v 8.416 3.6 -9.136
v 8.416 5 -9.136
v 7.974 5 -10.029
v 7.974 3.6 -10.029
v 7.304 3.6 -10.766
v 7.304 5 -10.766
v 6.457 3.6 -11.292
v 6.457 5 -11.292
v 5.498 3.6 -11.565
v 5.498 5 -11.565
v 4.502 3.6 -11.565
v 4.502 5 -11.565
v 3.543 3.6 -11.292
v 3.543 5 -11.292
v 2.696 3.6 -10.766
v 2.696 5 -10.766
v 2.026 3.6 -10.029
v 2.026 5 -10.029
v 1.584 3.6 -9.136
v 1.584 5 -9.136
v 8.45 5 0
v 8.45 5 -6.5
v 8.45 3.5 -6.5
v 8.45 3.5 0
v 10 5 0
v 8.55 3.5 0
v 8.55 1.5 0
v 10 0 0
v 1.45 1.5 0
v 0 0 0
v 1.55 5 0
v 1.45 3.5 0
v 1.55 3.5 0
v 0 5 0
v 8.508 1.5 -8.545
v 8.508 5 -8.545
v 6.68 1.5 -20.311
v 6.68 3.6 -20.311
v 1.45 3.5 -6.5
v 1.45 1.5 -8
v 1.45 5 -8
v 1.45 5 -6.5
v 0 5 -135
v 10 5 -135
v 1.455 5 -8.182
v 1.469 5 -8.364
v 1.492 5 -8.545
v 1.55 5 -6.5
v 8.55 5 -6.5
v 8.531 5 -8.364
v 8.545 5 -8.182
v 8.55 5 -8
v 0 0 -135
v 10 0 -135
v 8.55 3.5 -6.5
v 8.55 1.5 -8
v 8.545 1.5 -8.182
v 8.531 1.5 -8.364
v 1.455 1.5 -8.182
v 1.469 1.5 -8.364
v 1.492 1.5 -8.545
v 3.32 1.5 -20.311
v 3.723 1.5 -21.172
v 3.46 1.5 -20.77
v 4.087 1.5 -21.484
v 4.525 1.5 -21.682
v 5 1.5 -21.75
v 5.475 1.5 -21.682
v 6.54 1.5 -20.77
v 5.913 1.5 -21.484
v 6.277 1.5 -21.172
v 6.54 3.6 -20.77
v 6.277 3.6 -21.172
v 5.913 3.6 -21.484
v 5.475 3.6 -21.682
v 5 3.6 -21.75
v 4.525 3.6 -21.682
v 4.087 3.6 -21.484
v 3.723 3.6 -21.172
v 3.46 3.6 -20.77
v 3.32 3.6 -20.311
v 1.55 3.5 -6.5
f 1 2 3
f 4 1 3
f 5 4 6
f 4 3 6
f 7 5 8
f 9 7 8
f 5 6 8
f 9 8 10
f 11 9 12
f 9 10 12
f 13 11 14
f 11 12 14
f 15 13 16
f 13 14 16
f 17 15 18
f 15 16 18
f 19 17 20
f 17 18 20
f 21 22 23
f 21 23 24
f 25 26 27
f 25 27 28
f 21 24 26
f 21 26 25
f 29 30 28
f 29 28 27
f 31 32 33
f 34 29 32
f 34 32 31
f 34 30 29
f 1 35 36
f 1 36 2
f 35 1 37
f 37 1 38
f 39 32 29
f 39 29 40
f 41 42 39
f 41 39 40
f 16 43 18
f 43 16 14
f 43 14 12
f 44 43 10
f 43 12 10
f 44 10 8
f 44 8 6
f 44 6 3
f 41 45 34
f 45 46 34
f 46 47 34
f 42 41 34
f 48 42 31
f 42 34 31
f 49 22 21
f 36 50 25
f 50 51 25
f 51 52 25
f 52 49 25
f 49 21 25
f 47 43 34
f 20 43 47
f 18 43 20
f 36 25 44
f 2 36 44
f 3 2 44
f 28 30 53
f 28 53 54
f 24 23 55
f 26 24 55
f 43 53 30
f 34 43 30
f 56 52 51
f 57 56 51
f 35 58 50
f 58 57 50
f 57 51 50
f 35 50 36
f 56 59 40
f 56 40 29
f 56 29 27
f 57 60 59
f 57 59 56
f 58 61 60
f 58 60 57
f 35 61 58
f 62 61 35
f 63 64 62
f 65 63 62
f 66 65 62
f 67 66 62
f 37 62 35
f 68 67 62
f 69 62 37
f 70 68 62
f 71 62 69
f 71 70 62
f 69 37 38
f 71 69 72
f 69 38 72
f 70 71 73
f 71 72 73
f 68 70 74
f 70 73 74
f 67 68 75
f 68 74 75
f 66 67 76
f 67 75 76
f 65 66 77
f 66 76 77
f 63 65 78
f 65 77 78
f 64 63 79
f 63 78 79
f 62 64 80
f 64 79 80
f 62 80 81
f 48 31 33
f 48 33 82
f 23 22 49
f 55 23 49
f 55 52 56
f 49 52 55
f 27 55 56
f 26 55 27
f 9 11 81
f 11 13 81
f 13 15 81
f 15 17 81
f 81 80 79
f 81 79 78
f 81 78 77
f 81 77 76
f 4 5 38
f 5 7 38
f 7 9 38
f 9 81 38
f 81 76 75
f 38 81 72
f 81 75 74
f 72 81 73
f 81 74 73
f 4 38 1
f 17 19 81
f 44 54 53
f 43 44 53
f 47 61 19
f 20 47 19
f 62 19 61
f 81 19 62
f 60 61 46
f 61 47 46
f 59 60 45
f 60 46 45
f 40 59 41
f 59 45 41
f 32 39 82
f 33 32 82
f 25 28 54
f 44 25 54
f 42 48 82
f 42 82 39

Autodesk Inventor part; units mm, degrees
ref_plane "YZ Plane" through (0, 0, 0) normal (1, 0, 0) x (0, 1, 0)
ref_plane "XZ Plane" through (0, 0, 0) normal (0, 1, 0) x (-1, 0, 0)
ref_plane "XY Plane" through (0, 0, 0) normal (0, 0, 1) x (1, 0, 0)
sketch "Esquisse1" plane through (0, 0, 0) normal (1, 0, 0) x (0, 1, 0)
  line L0 (0, 0) -> (5, 0)
  line L1 (5, 0) -> (5, -30)
  line L2 (5, -30) -> (0, -30)
  line L3 (0, -30) -> (0, 0)
  dimension "d0" = 5
  dimension "d1" = 30
extrude "Extrusion1" add sketch "Esquisse1" along normal blind 10
sketch "Esquisse2" plane through (0, 5, 0) normal (0, 1, 0) x (1, 0, 0)
  line L0 (0, 0) -> (5, 0)
  line L1 (0, 0) -> (10, 0) projected
  line L2 (5, 0) -> (5, 8)
  arc A0 (1.4921, 8.545) -> (8.5079, 8.545) centre (5, 8) ccw
  line L3 (5, 21.75) -> (5, 20.05)
  arc A1 (6.6798, 20.311) -> (3.3202, 20.311) centre (5, 20.05) ccw
  line L4 (1.4921, 8.545) -> (3.3202, 20.311)
  line L5 (8.5079, 8.545) -> (6.6798, 20.311)
  line L6 (5, 4.45) -> (5, 11.55)
  line L7 (5, 18.35) -> (5, 21.75)
  dimension "d4" = 8
  dimension "d5" = 7.1
  dimension "d6" = 17.3
  dimension "d7" = 1.7
extrude "Extrusion2" cut sketch "Esquisse2" against normal blind 3.5
sketch "Esquisse3" plane through (0, 5, 0) normal (0, 1, 0) x (1, 0, 0)
  arc A0 (1.4921, 8.545) -> (8.5079, 8.545) centre (5, 8) ccw projected
  arc A1 (8.4161, 9.1358) -> (1.5839, 9.1358) centre (5, 8) ccw
  arc A2 (6.6798, 20.311) -> (3.3202, 20.311) centre (5, 20.05) ccw projected
  arc A3 (6.6798, 20.311) -> (3.3202, 20.311) centre (5, 20.05) ccw
  line L0 (1.4921, 8.545) -> (3.3202, 20.311) projected
  line L1 (3.3202, 20.311) -> (1.4921, 8.545)
  line L2 (6.6798, 20.311) -> (8.5079, 8.545)
  point P0 (0, 0)
  dimension "d24" = 7.2
extrude "Extrusion5" add sketch "Esquisse3" against normal blind 1.4 contours L0 A2 L2 A1
sketch "Esquisse5" plane through (0, 5, 0) normal (0, 1, 0) x (1, 0, 0)
  arc A0 (1.4921, 8.545) -> (8.5079, 8.545) centre (5, 8) ccw projected
  line L0 (5, 0) -> (1.45, 0)
  line L1 (0, 0) -> (10, 0) projected
  line L2 (1.45, 0) -> (1.45, 8)
  line L3 (1.45, 8) -> (8.55, 8)
  line L4 (8.55, 8) -> (8.55, 0)
  line L5 (8.55, 0) -> (1.45, 0)
  line L6 (5, 8) -> (5, 0)
  dimension "d27" = 3.55
  dimension "d28" = 7.1
extrude "Extrusion6" cut sketch "Esquisse5" against normal blind 3.5
sketch "Esquisse6" plane through (0, 5, 0) normal (0, 1, 0) x (1, 0, 0)
  arc A0 (8.4161, 9.1358) -> (1.5839, 9.1358) centre (5, 8) ccw projected
  line L0 (5, 8) -> (5, 0)
  line L1 (5, 0) -> (1.55, 0)
  line L2 (0, 0) -> (10, 0) projected
  line L3 (1.55, 0) -> (1.55, 6.5)
  line L4 (8.45, 6.5) -> (8.45, 0)
  line L5 (8.45, 0) -> (1.55, 0)
  line L6 (8.55, 8) -> (8.55, 0) projected
  line L7 (8.45, 6.5) -> (8.55, 6.5)
  line L8 (8.55, 6.5) -> (8.55, 0)
  line L9 (8.55, 0) -> (8.45, 0)
  line L10 (8.45, 0) -> (8.45, 6.5)
  line L11 (1.45, 0) -> (1.45, 8) projected
  line L12 (1.55, 6.5) -> (1.45, 6.5)
  line L13 (1.45, 6.5) -> (1.45, 0)
  line L14 (1.45, 0) -> (1.55, 0)
  line L15 (1.55, 0) -> (1.55, 6.5)
  dimension "d31" = 3.45
  dimension "d32" = 6.5
  dimension "d33" = 6.9
  dimension "d34" = 6.5
extrude "Extrusion8" add sketch "Esquisse6" against normal blind 1.5
sketch "Esquisse7" plane through (0, 0, -30) normal (0, -1, 0) x (1, 0, 0)
  line L0 (0, 0) -> (10, 0)
  line L1 (10, 0) -> (10, -105)
  line L2 (10, -105) -> (0, -105)
  line L3 (0, -105) -> (0, 0)
  point P0 (0, 30)
  dimension "d39" = 10
  dimension "d40" = 105
extrude "Extrusion9" add sketch "Esquisse7" against normal blind 5
properties part number "Barrière"
